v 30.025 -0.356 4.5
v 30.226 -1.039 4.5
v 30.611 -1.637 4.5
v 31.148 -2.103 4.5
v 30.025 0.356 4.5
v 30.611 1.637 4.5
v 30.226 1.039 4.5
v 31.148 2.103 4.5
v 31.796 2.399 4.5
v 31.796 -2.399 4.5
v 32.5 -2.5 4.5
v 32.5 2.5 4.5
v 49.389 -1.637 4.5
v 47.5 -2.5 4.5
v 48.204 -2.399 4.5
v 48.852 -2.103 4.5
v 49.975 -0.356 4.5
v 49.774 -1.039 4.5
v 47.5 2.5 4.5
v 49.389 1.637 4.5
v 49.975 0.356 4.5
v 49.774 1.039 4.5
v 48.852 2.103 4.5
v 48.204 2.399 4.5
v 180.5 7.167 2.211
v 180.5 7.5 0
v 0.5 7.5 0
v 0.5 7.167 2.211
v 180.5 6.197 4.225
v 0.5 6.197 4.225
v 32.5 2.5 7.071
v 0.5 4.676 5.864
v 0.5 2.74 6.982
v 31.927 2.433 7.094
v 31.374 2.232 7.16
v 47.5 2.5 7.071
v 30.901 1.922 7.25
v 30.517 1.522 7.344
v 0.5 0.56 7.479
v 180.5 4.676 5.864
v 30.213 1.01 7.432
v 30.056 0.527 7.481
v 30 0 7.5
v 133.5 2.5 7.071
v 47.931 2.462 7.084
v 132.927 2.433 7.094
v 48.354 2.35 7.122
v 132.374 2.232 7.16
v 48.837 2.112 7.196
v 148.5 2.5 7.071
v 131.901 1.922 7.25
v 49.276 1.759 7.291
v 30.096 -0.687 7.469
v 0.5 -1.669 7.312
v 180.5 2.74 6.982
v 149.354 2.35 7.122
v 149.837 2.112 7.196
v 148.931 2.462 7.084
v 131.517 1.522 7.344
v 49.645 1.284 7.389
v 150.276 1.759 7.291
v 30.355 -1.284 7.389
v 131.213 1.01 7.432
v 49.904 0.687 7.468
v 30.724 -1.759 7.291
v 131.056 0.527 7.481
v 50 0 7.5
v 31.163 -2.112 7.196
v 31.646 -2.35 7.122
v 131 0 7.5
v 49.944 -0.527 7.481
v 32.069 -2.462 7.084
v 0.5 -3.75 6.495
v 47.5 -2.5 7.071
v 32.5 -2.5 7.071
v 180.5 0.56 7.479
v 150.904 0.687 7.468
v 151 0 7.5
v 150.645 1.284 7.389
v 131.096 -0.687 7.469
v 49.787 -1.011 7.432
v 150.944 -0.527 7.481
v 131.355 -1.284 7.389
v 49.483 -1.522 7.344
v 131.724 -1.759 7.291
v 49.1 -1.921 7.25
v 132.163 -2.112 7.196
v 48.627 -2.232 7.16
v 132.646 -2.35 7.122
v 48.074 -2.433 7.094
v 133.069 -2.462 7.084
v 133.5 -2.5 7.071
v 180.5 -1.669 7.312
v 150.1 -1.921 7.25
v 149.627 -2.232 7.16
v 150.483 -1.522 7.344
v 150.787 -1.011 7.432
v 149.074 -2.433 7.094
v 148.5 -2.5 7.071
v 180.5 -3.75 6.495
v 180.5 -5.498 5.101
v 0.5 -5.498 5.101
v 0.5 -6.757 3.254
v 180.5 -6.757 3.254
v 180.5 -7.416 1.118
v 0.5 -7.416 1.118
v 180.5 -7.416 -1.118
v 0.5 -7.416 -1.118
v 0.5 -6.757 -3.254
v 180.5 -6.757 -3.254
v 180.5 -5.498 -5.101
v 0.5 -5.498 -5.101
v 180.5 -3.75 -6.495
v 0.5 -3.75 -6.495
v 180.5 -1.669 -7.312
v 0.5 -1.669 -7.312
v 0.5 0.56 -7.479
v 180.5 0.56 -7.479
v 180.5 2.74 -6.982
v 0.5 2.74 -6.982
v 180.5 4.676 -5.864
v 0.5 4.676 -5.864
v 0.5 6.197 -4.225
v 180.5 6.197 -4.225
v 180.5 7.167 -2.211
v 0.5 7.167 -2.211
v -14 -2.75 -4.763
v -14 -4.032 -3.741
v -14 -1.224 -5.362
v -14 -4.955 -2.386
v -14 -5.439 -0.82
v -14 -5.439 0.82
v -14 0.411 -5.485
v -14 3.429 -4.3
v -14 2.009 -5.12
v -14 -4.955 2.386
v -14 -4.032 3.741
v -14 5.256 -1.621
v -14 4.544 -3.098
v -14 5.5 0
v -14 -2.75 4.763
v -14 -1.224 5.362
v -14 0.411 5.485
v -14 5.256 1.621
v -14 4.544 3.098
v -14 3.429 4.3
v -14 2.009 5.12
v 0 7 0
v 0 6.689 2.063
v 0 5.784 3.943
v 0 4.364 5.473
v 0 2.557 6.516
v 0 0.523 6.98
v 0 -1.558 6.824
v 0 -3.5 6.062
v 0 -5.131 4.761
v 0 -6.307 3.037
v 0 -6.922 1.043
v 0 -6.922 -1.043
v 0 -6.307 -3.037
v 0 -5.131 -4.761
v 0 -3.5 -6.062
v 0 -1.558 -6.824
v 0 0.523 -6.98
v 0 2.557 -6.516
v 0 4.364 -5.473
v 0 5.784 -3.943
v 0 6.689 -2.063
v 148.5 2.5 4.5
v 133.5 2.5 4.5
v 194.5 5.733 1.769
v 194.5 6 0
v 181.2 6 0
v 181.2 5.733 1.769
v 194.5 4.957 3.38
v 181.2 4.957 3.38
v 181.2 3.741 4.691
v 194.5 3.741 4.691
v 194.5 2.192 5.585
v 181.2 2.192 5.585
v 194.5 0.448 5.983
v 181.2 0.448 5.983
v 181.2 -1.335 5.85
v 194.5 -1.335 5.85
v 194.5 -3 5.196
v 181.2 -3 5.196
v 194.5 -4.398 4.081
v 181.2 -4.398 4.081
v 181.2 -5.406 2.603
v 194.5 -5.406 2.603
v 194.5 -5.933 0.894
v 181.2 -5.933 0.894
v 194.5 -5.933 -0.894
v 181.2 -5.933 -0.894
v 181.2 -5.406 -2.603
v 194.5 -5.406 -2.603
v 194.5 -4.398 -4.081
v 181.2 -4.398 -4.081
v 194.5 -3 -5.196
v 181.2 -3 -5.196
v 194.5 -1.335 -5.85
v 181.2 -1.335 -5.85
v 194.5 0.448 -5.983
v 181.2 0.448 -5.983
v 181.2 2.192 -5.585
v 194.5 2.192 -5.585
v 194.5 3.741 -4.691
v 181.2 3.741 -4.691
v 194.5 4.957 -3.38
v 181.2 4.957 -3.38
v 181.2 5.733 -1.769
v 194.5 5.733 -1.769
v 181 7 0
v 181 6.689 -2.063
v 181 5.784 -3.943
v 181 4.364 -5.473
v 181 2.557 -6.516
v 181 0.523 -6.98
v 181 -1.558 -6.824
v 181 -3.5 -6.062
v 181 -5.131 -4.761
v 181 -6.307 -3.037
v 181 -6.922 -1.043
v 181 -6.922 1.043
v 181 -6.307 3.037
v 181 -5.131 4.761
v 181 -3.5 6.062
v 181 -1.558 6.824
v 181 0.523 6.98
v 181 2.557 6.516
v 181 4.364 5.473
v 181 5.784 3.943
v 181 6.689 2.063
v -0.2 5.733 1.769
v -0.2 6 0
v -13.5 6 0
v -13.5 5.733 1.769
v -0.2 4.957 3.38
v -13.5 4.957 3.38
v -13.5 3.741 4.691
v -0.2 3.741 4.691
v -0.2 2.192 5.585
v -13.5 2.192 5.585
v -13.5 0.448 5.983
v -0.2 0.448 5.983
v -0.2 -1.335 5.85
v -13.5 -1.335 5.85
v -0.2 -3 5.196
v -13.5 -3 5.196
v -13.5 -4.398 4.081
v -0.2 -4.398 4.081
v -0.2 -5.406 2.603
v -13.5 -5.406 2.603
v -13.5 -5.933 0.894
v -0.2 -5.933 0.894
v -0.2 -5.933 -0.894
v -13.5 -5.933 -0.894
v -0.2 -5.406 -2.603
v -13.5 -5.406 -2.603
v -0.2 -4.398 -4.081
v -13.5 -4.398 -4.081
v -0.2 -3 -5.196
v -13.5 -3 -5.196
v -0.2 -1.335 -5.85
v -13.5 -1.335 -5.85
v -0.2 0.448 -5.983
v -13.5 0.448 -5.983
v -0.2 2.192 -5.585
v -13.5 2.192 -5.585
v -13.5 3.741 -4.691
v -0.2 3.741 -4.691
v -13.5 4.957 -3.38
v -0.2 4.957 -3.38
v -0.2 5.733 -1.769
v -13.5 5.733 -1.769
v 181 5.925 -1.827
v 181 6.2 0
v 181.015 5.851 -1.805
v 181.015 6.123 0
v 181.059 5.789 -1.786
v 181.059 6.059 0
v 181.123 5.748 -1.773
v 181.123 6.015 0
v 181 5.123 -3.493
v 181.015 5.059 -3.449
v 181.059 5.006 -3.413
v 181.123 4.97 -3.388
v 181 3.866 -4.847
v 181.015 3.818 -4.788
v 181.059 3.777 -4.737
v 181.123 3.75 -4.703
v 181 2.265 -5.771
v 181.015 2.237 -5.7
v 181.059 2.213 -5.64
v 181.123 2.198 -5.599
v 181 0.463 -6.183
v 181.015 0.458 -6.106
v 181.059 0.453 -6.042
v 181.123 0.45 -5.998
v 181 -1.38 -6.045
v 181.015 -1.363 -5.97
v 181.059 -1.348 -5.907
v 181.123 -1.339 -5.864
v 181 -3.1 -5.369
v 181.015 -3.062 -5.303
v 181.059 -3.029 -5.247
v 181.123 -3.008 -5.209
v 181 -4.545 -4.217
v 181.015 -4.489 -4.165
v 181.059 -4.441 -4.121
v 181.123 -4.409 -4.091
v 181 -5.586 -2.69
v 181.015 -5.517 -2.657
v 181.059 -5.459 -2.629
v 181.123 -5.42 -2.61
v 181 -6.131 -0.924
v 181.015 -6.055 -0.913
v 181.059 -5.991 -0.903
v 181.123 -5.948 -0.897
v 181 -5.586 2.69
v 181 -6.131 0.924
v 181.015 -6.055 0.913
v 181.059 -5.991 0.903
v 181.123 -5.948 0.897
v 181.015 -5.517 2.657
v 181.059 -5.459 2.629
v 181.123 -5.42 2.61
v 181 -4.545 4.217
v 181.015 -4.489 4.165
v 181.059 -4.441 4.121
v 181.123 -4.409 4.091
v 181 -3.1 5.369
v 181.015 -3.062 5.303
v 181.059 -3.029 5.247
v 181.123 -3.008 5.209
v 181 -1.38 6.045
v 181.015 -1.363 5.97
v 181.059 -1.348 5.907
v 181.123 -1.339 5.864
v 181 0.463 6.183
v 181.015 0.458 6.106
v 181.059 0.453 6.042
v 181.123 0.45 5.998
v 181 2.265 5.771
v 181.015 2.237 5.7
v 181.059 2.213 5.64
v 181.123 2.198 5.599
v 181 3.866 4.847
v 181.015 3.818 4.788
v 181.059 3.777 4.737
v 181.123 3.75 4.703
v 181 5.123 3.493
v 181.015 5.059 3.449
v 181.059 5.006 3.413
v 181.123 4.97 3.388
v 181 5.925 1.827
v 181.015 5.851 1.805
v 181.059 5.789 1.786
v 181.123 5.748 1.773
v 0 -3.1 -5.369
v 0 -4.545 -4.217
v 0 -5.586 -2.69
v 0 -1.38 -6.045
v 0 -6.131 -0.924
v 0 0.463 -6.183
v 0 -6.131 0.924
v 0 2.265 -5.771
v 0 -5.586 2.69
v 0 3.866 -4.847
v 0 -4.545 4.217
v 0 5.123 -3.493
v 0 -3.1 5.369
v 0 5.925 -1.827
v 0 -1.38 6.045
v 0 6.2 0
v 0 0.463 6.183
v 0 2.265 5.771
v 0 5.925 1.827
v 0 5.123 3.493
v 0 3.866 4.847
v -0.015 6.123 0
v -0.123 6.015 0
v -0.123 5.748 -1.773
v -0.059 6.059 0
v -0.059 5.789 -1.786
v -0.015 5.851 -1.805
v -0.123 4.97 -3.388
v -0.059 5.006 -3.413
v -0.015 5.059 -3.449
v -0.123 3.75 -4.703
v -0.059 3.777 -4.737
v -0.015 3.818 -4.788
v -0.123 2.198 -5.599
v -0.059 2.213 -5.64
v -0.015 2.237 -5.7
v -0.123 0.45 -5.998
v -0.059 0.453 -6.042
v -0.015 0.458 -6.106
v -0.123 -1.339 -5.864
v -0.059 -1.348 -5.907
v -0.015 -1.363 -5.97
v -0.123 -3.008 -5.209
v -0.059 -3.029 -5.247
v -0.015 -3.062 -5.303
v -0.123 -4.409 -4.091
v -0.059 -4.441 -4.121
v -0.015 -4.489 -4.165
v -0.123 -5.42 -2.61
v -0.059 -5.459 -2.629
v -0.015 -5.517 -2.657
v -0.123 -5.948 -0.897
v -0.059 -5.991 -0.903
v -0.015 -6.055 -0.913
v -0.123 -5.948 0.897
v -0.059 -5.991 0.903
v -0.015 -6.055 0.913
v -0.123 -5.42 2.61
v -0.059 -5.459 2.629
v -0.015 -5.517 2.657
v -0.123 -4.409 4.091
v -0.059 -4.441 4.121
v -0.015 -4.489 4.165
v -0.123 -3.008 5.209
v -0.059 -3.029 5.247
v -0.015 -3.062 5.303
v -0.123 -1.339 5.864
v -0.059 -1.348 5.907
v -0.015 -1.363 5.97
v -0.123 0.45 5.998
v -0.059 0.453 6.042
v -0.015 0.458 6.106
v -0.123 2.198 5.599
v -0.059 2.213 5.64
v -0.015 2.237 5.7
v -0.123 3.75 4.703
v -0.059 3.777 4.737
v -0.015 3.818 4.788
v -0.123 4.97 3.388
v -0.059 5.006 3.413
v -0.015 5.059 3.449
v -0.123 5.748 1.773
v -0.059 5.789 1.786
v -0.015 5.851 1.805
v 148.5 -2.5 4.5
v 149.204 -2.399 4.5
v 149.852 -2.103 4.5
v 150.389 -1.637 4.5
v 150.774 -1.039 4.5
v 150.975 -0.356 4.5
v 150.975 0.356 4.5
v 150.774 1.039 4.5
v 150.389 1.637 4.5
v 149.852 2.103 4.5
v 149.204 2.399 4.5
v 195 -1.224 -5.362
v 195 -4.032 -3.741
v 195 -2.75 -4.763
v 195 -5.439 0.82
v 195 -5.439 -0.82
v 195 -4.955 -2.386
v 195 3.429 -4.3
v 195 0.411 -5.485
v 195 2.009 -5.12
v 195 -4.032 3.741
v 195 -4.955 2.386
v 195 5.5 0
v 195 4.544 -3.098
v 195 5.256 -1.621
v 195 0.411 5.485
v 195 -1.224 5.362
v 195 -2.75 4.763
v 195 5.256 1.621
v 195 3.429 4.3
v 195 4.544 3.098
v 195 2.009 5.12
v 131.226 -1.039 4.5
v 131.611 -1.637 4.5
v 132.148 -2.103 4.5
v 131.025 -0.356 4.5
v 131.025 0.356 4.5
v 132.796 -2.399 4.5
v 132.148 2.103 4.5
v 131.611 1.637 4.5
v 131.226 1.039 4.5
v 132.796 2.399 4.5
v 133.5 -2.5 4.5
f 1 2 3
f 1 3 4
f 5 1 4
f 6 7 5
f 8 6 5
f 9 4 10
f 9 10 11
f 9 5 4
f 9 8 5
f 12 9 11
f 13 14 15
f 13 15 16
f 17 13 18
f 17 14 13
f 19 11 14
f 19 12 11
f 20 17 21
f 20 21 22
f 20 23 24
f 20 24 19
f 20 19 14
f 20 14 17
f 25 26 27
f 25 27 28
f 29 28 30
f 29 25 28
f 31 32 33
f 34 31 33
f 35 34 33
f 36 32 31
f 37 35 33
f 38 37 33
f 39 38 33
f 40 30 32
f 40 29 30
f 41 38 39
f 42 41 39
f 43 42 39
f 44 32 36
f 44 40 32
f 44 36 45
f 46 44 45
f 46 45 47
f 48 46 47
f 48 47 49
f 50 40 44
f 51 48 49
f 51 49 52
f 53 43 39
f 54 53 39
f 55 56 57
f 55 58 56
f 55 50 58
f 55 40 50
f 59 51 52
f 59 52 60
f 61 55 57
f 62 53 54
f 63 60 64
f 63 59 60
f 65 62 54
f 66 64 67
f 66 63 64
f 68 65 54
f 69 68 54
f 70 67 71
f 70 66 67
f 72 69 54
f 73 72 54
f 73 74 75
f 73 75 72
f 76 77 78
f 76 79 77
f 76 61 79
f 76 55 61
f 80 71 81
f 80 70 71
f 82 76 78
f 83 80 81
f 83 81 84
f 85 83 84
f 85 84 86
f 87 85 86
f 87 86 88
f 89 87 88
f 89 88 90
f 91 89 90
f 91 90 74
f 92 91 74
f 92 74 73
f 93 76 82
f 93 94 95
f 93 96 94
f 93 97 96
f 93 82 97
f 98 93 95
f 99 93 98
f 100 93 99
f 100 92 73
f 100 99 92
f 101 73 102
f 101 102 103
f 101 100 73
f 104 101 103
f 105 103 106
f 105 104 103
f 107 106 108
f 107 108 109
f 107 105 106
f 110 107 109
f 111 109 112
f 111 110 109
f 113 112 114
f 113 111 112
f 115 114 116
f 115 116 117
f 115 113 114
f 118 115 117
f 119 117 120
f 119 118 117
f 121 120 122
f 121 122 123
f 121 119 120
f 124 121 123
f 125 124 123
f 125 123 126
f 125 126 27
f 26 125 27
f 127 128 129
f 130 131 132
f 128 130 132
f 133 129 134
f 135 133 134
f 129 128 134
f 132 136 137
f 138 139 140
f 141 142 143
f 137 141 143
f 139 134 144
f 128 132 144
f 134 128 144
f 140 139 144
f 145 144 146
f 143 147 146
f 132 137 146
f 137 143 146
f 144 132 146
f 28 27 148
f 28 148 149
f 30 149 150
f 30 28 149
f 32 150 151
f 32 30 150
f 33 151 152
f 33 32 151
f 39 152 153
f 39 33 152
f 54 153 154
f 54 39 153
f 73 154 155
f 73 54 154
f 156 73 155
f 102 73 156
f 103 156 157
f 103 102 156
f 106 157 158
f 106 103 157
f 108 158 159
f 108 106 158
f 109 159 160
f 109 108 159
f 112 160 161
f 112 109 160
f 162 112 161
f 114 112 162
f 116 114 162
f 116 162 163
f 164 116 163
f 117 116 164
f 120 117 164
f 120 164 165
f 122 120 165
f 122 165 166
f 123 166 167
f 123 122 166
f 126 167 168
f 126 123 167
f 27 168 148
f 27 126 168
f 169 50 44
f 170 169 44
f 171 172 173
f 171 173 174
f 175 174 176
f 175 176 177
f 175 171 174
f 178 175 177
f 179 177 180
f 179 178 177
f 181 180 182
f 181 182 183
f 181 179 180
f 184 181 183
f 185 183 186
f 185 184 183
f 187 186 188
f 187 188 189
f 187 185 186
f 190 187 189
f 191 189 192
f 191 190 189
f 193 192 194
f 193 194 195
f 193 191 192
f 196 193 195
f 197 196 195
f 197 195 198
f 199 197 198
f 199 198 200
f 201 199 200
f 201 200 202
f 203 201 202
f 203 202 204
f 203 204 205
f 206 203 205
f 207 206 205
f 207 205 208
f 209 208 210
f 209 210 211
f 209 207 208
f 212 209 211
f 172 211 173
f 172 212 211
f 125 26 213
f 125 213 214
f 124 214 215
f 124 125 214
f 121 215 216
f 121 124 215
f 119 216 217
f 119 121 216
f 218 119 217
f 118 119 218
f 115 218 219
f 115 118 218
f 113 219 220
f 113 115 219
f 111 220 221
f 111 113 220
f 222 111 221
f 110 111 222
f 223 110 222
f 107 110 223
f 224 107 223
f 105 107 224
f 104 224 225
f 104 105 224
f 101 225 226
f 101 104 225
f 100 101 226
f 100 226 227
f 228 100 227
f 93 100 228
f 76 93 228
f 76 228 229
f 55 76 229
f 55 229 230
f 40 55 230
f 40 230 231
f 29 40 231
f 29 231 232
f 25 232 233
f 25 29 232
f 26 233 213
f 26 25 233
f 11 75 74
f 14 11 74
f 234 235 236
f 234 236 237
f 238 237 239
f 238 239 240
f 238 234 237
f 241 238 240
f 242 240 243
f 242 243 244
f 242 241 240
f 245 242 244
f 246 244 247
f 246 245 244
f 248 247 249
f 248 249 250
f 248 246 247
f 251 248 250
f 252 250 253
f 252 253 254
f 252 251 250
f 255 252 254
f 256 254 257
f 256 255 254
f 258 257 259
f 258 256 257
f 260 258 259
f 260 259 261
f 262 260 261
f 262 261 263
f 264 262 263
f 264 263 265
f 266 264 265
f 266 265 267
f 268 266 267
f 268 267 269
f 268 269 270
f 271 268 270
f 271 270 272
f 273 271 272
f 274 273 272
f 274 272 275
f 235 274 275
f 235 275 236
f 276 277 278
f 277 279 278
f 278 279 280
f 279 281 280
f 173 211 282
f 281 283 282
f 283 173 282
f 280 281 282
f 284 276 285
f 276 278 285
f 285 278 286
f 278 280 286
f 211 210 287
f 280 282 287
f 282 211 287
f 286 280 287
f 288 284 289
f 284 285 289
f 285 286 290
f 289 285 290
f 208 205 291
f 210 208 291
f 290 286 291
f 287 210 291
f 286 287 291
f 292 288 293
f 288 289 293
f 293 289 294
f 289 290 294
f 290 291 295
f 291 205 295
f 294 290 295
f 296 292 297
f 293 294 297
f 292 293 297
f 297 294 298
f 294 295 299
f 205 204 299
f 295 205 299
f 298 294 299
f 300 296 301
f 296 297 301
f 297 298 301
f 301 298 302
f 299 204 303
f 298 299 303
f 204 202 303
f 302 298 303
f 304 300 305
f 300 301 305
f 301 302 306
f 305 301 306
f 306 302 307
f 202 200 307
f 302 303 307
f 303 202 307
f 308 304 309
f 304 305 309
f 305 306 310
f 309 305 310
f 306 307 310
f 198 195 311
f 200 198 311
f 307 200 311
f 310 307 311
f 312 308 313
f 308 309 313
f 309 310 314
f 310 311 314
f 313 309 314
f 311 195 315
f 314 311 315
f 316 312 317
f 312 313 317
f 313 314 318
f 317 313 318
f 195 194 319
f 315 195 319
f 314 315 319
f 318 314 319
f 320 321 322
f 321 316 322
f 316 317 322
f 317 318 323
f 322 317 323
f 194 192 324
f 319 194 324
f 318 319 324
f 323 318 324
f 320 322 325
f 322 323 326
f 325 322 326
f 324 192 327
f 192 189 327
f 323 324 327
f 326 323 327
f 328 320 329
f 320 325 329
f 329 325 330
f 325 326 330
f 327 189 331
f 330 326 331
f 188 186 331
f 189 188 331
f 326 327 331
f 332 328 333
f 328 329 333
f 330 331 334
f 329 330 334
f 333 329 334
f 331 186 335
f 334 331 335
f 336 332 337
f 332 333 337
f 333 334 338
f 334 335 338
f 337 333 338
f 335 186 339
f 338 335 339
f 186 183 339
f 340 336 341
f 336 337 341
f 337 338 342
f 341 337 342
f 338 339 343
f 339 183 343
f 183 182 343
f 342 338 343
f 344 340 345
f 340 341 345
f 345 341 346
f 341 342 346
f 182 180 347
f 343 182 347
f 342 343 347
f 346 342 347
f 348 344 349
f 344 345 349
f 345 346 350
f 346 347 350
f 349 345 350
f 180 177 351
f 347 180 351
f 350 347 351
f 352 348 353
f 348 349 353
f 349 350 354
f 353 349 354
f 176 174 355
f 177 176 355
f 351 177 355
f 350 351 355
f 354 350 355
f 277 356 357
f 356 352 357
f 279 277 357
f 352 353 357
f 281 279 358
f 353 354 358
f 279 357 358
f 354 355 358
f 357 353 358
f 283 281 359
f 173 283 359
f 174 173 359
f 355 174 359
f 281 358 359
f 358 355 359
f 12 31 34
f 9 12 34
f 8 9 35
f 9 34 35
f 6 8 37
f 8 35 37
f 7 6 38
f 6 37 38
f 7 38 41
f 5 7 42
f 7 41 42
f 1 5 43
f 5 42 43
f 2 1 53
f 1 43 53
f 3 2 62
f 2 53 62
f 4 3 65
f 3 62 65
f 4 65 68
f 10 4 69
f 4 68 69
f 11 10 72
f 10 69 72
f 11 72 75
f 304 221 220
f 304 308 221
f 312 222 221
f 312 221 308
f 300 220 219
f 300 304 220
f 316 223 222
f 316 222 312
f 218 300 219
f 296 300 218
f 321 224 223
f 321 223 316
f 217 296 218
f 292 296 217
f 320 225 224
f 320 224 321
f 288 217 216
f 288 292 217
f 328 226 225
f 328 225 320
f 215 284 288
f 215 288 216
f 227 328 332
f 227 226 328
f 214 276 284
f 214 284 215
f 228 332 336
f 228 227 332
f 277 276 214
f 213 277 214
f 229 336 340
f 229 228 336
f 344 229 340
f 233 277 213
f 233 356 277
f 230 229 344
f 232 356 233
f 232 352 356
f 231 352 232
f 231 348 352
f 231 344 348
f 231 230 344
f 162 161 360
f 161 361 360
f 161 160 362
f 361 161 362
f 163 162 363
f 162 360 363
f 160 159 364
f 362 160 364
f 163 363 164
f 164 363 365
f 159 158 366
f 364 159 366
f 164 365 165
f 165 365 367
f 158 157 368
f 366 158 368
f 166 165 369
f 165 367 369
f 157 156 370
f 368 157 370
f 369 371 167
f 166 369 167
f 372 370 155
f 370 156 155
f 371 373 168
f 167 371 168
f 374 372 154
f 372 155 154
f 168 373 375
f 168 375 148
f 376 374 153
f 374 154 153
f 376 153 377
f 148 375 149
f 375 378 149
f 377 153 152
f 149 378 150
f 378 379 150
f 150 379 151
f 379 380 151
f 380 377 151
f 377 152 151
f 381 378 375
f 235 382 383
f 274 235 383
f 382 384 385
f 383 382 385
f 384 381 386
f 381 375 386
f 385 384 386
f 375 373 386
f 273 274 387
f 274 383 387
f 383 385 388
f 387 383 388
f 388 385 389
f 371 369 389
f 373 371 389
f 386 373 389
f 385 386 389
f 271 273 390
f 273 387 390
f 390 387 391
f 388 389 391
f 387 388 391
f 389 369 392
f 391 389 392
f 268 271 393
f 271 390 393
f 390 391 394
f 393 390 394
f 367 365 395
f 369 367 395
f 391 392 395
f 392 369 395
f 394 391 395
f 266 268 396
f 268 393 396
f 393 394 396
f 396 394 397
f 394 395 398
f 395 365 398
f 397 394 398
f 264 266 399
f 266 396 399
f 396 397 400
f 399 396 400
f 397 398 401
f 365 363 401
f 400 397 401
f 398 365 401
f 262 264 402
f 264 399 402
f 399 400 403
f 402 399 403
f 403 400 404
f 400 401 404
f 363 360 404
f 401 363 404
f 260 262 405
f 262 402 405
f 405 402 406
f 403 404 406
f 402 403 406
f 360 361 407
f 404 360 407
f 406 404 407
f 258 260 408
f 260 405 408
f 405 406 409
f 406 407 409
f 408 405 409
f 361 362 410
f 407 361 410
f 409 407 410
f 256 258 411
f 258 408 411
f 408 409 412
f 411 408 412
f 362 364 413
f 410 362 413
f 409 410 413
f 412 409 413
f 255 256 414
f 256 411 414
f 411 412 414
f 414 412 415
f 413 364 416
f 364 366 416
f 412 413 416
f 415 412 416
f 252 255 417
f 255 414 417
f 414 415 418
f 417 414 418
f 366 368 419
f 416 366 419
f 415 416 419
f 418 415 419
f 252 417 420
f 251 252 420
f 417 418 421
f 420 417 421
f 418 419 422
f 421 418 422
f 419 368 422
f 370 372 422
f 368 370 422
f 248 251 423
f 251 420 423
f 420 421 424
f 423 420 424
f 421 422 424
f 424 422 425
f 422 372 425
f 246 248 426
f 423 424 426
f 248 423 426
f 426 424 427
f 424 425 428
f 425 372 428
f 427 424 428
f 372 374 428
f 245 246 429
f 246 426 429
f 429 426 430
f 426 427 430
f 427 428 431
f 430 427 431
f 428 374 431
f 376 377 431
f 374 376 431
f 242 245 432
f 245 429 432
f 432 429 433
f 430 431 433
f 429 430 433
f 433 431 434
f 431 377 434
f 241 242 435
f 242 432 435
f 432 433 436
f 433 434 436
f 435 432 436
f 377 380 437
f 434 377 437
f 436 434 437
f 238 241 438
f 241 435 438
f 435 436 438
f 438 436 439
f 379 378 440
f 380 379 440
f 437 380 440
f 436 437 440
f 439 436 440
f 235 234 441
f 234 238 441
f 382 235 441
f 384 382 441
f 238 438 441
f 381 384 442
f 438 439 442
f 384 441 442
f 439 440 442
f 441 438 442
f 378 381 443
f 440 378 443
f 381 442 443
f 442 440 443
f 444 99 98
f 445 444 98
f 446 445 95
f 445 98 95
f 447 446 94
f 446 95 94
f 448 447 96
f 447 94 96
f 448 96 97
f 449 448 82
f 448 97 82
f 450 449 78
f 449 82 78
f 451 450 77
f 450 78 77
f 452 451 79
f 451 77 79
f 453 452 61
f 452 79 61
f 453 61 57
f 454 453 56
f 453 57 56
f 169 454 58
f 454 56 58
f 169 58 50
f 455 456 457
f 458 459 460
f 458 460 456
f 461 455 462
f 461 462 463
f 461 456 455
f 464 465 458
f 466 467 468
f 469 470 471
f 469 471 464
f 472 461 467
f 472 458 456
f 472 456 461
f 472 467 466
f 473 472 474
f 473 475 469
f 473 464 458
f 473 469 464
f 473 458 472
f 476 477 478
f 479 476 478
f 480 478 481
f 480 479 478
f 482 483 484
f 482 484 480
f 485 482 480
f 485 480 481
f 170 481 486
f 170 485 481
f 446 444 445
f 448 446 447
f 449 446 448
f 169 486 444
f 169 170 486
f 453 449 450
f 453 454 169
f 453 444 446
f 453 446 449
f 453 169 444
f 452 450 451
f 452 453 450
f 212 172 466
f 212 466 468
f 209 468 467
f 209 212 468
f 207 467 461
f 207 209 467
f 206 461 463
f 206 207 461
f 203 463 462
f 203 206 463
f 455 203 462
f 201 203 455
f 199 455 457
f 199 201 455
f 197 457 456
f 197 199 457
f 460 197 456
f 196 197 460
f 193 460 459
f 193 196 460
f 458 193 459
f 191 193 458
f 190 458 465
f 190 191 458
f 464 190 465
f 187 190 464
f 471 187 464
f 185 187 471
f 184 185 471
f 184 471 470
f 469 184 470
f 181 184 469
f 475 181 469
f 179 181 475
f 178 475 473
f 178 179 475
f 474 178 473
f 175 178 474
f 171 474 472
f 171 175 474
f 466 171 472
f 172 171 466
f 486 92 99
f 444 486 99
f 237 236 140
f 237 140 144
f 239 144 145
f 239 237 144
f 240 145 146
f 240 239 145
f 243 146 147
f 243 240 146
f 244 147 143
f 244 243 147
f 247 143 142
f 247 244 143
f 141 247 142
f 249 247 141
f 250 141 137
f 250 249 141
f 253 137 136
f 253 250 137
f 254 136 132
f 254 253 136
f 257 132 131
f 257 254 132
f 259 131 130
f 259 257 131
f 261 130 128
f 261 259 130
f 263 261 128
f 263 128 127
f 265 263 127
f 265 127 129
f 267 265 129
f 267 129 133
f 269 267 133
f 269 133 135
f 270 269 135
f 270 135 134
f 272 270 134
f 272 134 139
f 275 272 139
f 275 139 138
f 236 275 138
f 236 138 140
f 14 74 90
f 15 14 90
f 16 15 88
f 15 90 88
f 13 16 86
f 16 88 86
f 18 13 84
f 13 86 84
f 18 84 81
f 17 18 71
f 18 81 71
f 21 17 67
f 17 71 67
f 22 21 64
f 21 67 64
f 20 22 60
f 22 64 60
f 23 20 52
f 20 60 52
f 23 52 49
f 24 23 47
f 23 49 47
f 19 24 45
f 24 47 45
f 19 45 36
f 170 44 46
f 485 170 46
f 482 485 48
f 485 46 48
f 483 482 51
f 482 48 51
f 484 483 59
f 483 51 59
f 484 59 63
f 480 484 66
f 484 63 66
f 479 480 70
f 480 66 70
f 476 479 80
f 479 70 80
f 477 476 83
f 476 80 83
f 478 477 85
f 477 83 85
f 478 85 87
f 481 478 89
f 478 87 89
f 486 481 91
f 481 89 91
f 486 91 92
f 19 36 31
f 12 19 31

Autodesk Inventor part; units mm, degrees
ref_plane "YZ Plane" through (0, 0, 0) normal (1, 0, 0) x (0, 1, 0)
ref_plane "XZ Plane" through (0, 0, 0) normal (0, 1, 0) x (-1, 0, 0)
ref_plane "XY Plane" through (0, 0, 0) normal (0, 0, 1) x (1, 0, 0)
sketch "Sketch_1" plane through (0, 0, 0) normal (0, 0, 1) x (1, 0, 0)
  line L0 (195, 0) -> (-14, 0)
  line L1 (-14, 0) -> (-14, 5.5)
  line L2 (-14, 5.5) -> (-13.5, 6)
  line L3 (-13.5, 6) -> (-0.2, 6)
  arc A0 (-0.2, 6) -> (0, 6.2) centre (-0.2, 6.2) ccw
  line L4 (0, 6.2) -> (0, 7)
  line L5 (0, 7) -> (0.5, 7.5)
  line L6 (0.5, 7.5) -> (180.5, 7.5)
  line L7 (180.5, 7.5) -> (181, 7)
  line L8 (181, 7) -> (181, 6.2)
  arc A1 (181, 6.2) -> (181.2, 6) centre (181.2, 6.2) ccw
  line L9 (181.2, 6) -> (194.5, 6)
  line L10 (194.5, 6) -> (195, 5.5)
  line L11 (195, 5.5) -> (195, 0)
  line L12 (195, 0) -> (-14, 0)
revolve "Revolution1" add sketch "Sketch_1" angle 360 about axis through (195, 0, 0) along (1, 0, 0)
sketch "_____2" plane through (0, 0, 7.5) normal (0, 0, 1) x (1, 0, 0)
  arc A0 (32.5, 2.5) -> (32.5, -2.5) centre (32.5, 0) ccw
  line L0 (32.5, -2.5) -> (47.5, -2.5)
  arc A1 (47.5, -2.5) -> (47.5, 2.5) centre (47.5, 0) ccw
  line L1 (47.5, 2.5) -> (32.5, 2.5)
extrude "Extrusion1" cut sketch "_____2" against normal blind 3
sketch "_____6" plane through (0, 0, 7.5) normal (0, 0, 1) x (1, 0, 0)
  arc A0 (133.5, 2.5) -> (133.5, -2.5) centre (133.5, 0) ccw
  line L0 (133.5, -2.5) -> (148.5, -2.5)
  arc A1 (148.5, -2.5) -> (148.5, 2.5) centre (148.5, 0) ccw
  line L1 (148.5, 2.5) -> (133.5, 2.5)
extrude "Extrusion2" cut sketch "_____6" against normal blind 3
properties part number "NSFRQ15-181-F14-P12-T14-Q12-WKC30-C20-K30-E20_s"
